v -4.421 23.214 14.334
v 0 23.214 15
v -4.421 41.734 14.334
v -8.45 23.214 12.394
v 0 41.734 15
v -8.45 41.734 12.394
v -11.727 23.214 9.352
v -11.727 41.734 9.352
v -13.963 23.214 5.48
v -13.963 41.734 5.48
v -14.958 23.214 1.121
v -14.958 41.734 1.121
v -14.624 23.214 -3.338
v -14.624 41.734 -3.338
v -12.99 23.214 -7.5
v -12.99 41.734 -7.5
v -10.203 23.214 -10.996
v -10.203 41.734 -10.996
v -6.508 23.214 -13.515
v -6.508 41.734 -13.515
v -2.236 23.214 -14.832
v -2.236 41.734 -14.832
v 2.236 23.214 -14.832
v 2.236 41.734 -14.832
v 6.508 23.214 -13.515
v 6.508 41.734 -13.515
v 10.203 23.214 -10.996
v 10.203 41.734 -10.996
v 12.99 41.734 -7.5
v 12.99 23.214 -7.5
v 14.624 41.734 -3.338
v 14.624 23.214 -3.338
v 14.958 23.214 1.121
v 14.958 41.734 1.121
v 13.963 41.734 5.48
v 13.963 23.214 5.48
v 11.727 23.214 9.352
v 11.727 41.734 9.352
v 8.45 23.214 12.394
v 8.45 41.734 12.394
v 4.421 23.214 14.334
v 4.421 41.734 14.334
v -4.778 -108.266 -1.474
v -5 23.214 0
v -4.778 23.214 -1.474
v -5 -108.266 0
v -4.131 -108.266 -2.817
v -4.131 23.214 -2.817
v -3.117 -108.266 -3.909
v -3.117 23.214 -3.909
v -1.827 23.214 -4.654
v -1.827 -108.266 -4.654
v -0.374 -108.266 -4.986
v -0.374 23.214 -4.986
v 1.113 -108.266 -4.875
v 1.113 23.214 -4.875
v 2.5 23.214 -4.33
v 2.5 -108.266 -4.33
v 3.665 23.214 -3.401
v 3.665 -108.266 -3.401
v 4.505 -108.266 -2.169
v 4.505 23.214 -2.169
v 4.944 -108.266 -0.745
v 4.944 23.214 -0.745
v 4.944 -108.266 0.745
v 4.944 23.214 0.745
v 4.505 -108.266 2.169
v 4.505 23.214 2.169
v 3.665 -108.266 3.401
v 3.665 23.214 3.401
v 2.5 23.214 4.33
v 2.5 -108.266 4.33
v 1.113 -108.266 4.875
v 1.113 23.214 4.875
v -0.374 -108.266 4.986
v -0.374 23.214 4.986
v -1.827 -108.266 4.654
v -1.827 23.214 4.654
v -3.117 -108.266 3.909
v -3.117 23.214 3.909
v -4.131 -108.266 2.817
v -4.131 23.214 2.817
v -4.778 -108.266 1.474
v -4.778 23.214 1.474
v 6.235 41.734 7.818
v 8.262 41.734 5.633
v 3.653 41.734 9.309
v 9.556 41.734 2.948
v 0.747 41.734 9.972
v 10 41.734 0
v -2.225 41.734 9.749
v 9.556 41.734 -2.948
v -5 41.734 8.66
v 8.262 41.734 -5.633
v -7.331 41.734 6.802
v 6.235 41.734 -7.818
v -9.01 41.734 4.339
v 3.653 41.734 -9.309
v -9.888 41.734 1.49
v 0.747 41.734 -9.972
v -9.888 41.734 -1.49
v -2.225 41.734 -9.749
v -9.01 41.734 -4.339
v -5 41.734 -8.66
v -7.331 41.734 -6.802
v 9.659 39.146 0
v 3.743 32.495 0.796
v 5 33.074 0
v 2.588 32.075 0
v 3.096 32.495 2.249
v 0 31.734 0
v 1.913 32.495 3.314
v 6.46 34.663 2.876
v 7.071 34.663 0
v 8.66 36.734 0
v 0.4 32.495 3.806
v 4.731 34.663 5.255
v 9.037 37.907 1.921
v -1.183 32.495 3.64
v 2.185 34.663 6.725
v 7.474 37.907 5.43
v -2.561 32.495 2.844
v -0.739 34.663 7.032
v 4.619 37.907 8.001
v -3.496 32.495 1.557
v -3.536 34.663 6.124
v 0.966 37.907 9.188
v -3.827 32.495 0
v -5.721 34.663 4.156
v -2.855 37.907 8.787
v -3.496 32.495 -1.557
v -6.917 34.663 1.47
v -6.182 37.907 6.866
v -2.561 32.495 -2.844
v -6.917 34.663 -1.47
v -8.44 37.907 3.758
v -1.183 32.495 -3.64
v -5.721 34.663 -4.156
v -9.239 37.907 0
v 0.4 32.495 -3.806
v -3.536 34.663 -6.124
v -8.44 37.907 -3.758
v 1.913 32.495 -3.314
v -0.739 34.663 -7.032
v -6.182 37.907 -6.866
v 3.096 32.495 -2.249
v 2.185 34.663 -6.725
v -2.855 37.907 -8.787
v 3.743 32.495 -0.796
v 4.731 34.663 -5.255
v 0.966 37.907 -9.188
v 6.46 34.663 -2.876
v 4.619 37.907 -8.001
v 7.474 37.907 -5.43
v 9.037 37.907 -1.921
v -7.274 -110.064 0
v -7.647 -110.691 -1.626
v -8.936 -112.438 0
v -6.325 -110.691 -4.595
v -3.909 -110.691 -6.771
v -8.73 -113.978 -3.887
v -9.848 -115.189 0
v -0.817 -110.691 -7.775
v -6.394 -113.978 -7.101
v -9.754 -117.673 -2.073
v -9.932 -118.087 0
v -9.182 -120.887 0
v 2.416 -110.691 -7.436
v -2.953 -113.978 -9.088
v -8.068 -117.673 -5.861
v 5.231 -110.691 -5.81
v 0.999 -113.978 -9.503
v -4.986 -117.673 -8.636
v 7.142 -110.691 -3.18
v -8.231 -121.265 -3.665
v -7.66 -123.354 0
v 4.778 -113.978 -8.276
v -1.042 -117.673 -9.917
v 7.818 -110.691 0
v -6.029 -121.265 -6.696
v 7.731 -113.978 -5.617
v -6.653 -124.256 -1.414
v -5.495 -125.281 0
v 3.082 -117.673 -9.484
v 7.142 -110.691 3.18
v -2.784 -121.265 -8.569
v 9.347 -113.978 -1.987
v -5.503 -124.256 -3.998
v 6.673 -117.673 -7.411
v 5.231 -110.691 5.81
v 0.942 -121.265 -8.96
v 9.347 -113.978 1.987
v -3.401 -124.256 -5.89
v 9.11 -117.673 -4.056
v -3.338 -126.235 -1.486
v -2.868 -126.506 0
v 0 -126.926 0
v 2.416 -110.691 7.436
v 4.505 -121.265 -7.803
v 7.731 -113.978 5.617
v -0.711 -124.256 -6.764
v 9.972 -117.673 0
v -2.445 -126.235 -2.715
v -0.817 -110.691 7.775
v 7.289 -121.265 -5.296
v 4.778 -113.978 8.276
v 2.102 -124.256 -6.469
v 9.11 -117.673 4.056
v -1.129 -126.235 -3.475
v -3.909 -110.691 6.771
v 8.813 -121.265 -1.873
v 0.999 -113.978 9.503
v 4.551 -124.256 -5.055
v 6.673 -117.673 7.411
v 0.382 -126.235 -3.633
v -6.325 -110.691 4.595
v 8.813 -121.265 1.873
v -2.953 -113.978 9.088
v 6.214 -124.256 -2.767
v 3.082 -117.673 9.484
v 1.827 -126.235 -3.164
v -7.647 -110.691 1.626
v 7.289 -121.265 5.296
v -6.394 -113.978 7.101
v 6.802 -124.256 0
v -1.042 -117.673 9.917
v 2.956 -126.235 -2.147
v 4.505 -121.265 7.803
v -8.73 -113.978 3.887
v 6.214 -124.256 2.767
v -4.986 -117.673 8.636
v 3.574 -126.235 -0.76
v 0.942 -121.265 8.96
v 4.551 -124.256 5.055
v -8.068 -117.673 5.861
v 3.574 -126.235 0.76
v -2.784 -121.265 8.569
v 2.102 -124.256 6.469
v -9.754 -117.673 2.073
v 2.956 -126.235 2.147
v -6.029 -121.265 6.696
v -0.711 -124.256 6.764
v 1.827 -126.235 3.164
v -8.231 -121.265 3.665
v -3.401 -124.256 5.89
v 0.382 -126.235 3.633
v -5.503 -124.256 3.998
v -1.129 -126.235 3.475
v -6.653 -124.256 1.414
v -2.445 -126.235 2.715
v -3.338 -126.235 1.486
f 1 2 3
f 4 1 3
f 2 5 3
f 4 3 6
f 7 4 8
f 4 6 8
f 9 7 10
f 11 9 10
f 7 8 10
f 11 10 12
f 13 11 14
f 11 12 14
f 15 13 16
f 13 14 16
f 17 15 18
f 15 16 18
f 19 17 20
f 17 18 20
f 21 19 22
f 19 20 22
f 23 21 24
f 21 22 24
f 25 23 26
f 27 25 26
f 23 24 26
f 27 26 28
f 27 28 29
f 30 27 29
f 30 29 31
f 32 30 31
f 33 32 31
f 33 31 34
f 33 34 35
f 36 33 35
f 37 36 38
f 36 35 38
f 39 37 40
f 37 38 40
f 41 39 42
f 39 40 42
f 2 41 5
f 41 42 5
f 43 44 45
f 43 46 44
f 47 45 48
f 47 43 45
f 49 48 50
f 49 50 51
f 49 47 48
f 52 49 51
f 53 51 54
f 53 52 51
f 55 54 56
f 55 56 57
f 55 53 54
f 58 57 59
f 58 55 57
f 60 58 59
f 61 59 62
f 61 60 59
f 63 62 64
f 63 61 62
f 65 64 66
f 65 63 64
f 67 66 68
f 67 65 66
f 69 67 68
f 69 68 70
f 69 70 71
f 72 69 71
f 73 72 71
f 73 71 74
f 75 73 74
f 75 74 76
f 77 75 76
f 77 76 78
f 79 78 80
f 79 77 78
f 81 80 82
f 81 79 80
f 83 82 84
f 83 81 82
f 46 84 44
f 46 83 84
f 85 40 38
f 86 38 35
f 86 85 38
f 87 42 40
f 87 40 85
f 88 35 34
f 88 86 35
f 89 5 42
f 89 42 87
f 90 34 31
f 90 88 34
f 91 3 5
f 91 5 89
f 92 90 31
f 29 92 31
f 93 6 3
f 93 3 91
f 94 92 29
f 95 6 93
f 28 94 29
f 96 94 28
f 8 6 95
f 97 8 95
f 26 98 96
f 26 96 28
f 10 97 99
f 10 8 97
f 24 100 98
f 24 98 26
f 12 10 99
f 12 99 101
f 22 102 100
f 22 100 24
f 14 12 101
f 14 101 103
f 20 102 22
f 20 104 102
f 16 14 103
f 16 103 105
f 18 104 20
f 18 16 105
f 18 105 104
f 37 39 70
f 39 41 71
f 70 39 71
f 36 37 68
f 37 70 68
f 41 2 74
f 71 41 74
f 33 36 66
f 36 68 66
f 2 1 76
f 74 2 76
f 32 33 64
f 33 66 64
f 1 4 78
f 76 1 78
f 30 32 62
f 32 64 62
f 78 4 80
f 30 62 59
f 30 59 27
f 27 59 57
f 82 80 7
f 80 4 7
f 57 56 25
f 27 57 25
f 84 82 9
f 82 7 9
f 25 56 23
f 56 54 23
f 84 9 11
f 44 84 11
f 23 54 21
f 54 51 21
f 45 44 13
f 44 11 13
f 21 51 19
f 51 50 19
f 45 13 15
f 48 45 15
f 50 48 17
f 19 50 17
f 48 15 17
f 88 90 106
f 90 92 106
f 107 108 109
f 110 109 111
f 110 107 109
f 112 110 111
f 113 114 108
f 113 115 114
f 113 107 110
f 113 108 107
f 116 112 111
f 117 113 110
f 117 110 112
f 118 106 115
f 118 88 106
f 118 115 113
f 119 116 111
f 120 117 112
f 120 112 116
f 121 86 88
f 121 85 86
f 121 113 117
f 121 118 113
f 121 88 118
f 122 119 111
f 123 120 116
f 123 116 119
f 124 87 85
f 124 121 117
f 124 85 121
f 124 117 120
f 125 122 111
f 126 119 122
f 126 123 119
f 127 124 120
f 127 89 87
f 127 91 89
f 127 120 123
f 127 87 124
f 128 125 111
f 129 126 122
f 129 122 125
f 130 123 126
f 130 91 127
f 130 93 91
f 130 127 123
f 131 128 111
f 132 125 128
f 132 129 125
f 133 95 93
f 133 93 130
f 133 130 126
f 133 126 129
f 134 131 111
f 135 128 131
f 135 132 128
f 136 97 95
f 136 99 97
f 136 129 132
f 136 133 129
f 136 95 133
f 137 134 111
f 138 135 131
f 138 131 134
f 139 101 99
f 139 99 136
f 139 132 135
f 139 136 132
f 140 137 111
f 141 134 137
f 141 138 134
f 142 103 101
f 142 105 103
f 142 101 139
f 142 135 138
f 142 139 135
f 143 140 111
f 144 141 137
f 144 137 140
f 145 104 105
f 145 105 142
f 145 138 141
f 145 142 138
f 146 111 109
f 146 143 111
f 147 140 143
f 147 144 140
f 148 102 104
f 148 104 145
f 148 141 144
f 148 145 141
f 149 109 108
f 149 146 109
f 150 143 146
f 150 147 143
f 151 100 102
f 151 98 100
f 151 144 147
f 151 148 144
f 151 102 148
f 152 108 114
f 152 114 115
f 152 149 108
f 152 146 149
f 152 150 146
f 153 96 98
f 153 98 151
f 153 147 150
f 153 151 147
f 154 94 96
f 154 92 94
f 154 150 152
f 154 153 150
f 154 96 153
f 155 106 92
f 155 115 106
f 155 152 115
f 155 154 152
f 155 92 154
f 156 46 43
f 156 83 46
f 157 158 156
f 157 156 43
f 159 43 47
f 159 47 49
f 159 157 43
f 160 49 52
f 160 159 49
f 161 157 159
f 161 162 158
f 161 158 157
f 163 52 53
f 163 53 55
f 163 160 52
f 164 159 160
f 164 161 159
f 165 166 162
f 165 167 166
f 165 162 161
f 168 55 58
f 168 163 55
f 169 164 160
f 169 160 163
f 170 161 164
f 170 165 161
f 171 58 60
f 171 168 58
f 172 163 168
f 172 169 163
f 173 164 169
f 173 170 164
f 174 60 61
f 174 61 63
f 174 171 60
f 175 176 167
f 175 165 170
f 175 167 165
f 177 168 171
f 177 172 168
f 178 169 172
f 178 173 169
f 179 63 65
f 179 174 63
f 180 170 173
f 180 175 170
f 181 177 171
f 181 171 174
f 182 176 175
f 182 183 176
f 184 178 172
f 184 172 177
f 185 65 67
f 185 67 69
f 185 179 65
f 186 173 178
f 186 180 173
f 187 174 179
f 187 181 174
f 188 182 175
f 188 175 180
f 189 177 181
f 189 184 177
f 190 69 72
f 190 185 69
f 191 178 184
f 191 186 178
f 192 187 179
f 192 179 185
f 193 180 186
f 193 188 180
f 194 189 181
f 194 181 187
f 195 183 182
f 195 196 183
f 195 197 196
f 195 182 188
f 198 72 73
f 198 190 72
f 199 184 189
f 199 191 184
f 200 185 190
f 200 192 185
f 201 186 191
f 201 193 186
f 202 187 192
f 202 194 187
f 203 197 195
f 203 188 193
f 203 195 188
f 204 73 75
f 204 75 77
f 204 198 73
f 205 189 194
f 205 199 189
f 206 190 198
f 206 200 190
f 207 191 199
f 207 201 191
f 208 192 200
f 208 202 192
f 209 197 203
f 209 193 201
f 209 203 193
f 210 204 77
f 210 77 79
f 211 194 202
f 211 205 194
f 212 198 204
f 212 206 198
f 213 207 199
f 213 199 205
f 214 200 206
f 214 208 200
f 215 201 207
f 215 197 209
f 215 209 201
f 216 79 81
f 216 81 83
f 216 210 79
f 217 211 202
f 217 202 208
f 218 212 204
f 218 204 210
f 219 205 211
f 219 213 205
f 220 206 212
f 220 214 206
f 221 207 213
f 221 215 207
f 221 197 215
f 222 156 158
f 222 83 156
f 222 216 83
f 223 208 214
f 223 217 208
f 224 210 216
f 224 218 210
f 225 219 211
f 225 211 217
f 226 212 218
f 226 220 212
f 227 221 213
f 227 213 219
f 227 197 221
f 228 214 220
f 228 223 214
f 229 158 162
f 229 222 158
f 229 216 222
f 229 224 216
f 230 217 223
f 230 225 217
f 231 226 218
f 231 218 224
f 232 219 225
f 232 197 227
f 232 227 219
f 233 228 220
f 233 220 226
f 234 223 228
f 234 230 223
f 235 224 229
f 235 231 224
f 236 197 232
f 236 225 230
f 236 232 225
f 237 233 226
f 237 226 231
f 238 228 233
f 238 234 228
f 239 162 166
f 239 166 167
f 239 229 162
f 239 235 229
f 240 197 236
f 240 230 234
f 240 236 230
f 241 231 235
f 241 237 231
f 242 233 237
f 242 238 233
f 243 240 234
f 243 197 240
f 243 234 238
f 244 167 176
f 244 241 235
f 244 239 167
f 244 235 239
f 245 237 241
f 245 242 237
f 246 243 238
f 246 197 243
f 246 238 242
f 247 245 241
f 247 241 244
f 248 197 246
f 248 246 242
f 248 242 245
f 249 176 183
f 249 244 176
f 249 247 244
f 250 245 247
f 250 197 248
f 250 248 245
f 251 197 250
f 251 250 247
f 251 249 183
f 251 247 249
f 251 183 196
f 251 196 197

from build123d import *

# Parameters (mm, degrees)
SKETCH3_W = 15
SKETCH3_H = 18.520312213


with BuildPart() as part:
    # Sketch1 → Revolve1 (revolve)
    with BuildSketch(Plane.XY, mode=Mode.PRIVATE) as revolve1_sk:
        with BuildLine():
            Line((0, 41.73429327), (5, 41.73429327))
            Line((5, 41.73429327), (5, -108.26570673))
            ThreePointArc((5, -108.26570673), (9.659258263, -119.514151219), (0, -126.925960768))
            Line((0, -126.925960768), (0, 41.73429327))
        make_face()
    revolve(revolve1_sk.sketch.rotate(Axis((0, 41.73429327, 0), (0, -1, 0)), 180), axis=Axis((0, 41.73429327, 0), (0, -1, 0)))

    # Sketch3 → Revolve3 (revolve)
    with BuildSketch(Plane.XY, mode=Mode.PRIVATE) as revolve3_sk:
        with Locations((7.5, 32.474137164)):
            Rectangle(SKETCH3_W, SKETCH3_H)
    revolve(revolve3_sk.sketch.rotate(Axis((0, 41.73429327, 0), (0, -1, 0)), 90), axis=Axis((0, 41.73429327, 0), (0, -1, 0)))

    # Sketch5 → Cut-Revolve2 (revolve, cut)
    with BuildSketch(Plane.XY):
        with BuildLine():
            Line((0, 41.73429327), (0, 31.73429327))
            ThreePointArc((0, 31.73429327), (7.071067812, 34.663225458), (10, 41.73429327))
            Line((10, 41.73429327), (0, 41.73429327))
        make_face()
    revolve(axis=Axis((0, 41.73429327, 0), (0, -1, 0)), mode=Mode.SUBTRACT)


solid = part.part
